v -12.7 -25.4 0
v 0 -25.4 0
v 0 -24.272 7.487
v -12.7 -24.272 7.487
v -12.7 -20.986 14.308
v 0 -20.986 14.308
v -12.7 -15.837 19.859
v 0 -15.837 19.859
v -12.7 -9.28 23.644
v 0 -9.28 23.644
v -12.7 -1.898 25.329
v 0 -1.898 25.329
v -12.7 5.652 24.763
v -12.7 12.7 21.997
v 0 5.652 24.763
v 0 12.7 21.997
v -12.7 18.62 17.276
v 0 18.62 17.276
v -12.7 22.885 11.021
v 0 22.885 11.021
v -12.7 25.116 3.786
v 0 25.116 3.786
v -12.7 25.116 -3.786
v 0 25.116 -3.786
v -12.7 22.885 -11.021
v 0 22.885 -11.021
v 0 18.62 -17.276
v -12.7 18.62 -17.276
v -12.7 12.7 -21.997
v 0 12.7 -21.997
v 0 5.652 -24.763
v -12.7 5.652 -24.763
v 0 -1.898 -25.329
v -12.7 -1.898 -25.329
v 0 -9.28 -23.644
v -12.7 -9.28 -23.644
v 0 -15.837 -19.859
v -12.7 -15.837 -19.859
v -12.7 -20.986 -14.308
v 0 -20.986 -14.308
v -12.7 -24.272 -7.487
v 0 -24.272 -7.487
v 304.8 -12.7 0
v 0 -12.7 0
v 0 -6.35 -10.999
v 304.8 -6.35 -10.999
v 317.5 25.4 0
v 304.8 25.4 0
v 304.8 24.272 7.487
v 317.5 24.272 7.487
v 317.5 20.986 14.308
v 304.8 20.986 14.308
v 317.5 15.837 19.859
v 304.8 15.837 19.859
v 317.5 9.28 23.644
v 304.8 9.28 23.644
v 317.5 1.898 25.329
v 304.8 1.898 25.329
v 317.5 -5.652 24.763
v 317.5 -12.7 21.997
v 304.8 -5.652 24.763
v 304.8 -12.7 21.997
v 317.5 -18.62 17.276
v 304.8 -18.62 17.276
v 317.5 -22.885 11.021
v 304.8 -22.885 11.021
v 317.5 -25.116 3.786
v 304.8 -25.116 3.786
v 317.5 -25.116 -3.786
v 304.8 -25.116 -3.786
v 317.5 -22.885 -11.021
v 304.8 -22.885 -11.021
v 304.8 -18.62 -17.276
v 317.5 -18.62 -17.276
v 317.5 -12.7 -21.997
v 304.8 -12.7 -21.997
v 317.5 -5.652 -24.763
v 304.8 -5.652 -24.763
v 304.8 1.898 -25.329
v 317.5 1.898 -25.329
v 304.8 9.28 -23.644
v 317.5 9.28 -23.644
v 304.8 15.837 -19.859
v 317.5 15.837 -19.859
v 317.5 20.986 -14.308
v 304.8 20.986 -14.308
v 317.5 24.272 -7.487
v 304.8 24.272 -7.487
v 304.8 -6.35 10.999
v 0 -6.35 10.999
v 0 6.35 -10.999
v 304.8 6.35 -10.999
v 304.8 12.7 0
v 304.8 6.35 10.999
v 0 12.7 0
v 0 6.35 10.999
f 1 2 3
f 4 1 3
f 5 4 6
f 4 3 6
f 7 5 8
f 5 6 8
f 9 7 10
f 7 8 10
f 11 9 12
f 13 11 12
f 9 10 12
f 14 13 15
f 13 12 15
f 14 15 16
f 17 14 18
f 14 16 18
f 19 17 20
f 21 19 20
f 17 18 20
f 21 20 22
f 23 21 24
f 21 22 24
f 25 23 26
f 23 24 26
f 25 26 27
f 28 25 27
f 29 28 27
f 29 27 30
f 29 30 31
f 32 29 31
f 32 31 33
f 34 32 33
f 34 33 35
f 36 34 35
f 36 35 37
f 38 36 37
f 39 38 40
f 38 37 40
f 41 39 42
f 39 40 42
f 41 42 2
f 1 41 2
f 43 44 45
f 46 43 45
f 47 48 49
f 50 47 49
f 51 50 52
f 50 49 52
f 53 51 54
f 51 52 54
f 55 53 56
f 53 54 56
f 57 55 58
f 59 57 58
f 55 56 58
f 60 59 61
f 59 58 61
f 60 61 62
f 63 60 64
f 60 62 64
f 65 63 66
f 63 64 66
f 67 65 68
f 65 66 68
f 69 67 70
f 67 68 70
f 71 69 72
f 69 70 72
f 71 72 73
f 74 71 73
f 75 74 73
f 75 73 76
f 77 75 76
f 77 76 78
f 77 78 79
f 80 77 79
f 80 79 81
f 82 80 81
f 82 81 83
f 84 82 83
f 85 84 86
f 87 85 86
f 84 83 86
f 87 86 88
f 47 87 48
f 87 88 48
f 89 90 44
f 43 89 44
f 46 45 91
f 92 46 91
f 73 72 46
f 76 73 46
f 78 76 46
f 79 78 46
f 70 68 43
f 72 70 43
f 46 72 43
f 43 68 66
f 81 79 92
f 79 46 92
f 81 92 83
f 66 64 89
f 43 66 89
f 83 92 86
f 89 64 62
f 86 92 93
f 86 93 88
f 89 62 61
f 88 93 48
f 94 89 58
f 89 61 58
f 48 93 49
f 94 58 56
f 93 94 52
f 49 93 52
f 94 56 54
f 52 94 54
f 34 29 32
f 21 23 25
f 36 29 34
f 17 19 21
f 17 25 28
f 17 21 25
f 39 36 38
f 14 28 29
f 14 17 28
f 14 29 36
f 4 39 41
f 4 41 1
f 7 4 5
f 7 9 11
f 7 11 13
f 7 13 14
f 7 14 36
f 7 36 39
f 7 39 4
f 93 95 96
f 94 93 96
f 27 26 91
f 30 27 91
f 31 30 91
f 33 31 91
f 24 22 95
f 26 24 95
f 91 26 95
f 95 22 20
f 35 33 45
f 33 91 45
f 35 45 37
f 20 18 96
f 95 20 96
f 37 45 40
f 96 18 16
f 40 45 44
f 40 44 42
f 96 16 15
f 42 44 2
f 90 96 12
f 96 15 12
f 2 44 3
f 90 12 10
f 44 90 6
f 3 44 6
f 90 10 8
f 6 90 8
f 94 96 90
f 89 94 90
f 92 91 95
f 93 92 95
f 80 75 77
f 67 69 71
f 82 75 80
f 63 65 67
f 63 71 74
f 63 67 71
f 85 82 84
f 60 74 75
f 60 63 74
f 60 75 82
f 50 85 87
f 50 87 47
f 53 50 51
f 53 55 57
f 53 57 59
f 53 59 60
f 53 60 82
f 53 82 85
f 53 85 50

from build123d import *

# Parameters (mm, degrees)
F1_DEPTH = 304.8
F2_R     = 25.4
F3_DEPTH = 12.7
F4_R     = 25.4
F5_DEPTH = 12.7


with BuildPart() as f1:
    # F0 (on Right) → F1 (new body)
    with BuildSketch(Plane.YZ):
        Polygon((6.35, -10.9985226281), (12.7, 0), (6.35, 10.9985226281), (-6.35, 10.9985226281), (-12.7, 0), (-6.35, -10.9985226281), align=None)
    extrude(amount=F1_DEPTH)

    # F2 (on face) → F3 (join)
    with BuildSketch(Plane.YZ.offset(304.8)):
        Circle(F2_R)
        Polygon((6.35, -10.9985226281), (-6.35, -10.9985226281), (-12.7, 0), (-6.35, 10.9985226281), (6.35, 10.9985226281), (12.7, 0), align=None, mode=Mode.SUBTRACT)
        Polygon((-12.7, 0), (-6.35, -10.9985226281), (6.35, -10.9985226281), (12.7, 0), (6.35, 10.9985226281), (-6.35, 10.9985226281), align=None)
    extrude(amount=F3_DEPTH)

    # F4 (on face) → F5 (join)
    with BuildSketch(Plane(origin=(0, 0, 0), x_dir=(0, -1, 0), z_dir=(-1, 0, 0))):
        Circle(F4_R)
        Polygon((6.35, -10.9985226281), (-6.35, -10.9985226281), (-12.7, 0), (-6.35, 10.9985226281), (6.35, 10.9985226281), (12.7, 0), align=None, mode=Mode.SUBTRACT)
        Polygon((-12.7, 0), (-6.35, -10.9985226281), (6.35, -10.9985226281), (12.7, 0), (6.35, 10.9985226281), (-6.35, 10.9985226281), align=None)
    extrude(amount=F5_DEPTH)


solid = f1.part
